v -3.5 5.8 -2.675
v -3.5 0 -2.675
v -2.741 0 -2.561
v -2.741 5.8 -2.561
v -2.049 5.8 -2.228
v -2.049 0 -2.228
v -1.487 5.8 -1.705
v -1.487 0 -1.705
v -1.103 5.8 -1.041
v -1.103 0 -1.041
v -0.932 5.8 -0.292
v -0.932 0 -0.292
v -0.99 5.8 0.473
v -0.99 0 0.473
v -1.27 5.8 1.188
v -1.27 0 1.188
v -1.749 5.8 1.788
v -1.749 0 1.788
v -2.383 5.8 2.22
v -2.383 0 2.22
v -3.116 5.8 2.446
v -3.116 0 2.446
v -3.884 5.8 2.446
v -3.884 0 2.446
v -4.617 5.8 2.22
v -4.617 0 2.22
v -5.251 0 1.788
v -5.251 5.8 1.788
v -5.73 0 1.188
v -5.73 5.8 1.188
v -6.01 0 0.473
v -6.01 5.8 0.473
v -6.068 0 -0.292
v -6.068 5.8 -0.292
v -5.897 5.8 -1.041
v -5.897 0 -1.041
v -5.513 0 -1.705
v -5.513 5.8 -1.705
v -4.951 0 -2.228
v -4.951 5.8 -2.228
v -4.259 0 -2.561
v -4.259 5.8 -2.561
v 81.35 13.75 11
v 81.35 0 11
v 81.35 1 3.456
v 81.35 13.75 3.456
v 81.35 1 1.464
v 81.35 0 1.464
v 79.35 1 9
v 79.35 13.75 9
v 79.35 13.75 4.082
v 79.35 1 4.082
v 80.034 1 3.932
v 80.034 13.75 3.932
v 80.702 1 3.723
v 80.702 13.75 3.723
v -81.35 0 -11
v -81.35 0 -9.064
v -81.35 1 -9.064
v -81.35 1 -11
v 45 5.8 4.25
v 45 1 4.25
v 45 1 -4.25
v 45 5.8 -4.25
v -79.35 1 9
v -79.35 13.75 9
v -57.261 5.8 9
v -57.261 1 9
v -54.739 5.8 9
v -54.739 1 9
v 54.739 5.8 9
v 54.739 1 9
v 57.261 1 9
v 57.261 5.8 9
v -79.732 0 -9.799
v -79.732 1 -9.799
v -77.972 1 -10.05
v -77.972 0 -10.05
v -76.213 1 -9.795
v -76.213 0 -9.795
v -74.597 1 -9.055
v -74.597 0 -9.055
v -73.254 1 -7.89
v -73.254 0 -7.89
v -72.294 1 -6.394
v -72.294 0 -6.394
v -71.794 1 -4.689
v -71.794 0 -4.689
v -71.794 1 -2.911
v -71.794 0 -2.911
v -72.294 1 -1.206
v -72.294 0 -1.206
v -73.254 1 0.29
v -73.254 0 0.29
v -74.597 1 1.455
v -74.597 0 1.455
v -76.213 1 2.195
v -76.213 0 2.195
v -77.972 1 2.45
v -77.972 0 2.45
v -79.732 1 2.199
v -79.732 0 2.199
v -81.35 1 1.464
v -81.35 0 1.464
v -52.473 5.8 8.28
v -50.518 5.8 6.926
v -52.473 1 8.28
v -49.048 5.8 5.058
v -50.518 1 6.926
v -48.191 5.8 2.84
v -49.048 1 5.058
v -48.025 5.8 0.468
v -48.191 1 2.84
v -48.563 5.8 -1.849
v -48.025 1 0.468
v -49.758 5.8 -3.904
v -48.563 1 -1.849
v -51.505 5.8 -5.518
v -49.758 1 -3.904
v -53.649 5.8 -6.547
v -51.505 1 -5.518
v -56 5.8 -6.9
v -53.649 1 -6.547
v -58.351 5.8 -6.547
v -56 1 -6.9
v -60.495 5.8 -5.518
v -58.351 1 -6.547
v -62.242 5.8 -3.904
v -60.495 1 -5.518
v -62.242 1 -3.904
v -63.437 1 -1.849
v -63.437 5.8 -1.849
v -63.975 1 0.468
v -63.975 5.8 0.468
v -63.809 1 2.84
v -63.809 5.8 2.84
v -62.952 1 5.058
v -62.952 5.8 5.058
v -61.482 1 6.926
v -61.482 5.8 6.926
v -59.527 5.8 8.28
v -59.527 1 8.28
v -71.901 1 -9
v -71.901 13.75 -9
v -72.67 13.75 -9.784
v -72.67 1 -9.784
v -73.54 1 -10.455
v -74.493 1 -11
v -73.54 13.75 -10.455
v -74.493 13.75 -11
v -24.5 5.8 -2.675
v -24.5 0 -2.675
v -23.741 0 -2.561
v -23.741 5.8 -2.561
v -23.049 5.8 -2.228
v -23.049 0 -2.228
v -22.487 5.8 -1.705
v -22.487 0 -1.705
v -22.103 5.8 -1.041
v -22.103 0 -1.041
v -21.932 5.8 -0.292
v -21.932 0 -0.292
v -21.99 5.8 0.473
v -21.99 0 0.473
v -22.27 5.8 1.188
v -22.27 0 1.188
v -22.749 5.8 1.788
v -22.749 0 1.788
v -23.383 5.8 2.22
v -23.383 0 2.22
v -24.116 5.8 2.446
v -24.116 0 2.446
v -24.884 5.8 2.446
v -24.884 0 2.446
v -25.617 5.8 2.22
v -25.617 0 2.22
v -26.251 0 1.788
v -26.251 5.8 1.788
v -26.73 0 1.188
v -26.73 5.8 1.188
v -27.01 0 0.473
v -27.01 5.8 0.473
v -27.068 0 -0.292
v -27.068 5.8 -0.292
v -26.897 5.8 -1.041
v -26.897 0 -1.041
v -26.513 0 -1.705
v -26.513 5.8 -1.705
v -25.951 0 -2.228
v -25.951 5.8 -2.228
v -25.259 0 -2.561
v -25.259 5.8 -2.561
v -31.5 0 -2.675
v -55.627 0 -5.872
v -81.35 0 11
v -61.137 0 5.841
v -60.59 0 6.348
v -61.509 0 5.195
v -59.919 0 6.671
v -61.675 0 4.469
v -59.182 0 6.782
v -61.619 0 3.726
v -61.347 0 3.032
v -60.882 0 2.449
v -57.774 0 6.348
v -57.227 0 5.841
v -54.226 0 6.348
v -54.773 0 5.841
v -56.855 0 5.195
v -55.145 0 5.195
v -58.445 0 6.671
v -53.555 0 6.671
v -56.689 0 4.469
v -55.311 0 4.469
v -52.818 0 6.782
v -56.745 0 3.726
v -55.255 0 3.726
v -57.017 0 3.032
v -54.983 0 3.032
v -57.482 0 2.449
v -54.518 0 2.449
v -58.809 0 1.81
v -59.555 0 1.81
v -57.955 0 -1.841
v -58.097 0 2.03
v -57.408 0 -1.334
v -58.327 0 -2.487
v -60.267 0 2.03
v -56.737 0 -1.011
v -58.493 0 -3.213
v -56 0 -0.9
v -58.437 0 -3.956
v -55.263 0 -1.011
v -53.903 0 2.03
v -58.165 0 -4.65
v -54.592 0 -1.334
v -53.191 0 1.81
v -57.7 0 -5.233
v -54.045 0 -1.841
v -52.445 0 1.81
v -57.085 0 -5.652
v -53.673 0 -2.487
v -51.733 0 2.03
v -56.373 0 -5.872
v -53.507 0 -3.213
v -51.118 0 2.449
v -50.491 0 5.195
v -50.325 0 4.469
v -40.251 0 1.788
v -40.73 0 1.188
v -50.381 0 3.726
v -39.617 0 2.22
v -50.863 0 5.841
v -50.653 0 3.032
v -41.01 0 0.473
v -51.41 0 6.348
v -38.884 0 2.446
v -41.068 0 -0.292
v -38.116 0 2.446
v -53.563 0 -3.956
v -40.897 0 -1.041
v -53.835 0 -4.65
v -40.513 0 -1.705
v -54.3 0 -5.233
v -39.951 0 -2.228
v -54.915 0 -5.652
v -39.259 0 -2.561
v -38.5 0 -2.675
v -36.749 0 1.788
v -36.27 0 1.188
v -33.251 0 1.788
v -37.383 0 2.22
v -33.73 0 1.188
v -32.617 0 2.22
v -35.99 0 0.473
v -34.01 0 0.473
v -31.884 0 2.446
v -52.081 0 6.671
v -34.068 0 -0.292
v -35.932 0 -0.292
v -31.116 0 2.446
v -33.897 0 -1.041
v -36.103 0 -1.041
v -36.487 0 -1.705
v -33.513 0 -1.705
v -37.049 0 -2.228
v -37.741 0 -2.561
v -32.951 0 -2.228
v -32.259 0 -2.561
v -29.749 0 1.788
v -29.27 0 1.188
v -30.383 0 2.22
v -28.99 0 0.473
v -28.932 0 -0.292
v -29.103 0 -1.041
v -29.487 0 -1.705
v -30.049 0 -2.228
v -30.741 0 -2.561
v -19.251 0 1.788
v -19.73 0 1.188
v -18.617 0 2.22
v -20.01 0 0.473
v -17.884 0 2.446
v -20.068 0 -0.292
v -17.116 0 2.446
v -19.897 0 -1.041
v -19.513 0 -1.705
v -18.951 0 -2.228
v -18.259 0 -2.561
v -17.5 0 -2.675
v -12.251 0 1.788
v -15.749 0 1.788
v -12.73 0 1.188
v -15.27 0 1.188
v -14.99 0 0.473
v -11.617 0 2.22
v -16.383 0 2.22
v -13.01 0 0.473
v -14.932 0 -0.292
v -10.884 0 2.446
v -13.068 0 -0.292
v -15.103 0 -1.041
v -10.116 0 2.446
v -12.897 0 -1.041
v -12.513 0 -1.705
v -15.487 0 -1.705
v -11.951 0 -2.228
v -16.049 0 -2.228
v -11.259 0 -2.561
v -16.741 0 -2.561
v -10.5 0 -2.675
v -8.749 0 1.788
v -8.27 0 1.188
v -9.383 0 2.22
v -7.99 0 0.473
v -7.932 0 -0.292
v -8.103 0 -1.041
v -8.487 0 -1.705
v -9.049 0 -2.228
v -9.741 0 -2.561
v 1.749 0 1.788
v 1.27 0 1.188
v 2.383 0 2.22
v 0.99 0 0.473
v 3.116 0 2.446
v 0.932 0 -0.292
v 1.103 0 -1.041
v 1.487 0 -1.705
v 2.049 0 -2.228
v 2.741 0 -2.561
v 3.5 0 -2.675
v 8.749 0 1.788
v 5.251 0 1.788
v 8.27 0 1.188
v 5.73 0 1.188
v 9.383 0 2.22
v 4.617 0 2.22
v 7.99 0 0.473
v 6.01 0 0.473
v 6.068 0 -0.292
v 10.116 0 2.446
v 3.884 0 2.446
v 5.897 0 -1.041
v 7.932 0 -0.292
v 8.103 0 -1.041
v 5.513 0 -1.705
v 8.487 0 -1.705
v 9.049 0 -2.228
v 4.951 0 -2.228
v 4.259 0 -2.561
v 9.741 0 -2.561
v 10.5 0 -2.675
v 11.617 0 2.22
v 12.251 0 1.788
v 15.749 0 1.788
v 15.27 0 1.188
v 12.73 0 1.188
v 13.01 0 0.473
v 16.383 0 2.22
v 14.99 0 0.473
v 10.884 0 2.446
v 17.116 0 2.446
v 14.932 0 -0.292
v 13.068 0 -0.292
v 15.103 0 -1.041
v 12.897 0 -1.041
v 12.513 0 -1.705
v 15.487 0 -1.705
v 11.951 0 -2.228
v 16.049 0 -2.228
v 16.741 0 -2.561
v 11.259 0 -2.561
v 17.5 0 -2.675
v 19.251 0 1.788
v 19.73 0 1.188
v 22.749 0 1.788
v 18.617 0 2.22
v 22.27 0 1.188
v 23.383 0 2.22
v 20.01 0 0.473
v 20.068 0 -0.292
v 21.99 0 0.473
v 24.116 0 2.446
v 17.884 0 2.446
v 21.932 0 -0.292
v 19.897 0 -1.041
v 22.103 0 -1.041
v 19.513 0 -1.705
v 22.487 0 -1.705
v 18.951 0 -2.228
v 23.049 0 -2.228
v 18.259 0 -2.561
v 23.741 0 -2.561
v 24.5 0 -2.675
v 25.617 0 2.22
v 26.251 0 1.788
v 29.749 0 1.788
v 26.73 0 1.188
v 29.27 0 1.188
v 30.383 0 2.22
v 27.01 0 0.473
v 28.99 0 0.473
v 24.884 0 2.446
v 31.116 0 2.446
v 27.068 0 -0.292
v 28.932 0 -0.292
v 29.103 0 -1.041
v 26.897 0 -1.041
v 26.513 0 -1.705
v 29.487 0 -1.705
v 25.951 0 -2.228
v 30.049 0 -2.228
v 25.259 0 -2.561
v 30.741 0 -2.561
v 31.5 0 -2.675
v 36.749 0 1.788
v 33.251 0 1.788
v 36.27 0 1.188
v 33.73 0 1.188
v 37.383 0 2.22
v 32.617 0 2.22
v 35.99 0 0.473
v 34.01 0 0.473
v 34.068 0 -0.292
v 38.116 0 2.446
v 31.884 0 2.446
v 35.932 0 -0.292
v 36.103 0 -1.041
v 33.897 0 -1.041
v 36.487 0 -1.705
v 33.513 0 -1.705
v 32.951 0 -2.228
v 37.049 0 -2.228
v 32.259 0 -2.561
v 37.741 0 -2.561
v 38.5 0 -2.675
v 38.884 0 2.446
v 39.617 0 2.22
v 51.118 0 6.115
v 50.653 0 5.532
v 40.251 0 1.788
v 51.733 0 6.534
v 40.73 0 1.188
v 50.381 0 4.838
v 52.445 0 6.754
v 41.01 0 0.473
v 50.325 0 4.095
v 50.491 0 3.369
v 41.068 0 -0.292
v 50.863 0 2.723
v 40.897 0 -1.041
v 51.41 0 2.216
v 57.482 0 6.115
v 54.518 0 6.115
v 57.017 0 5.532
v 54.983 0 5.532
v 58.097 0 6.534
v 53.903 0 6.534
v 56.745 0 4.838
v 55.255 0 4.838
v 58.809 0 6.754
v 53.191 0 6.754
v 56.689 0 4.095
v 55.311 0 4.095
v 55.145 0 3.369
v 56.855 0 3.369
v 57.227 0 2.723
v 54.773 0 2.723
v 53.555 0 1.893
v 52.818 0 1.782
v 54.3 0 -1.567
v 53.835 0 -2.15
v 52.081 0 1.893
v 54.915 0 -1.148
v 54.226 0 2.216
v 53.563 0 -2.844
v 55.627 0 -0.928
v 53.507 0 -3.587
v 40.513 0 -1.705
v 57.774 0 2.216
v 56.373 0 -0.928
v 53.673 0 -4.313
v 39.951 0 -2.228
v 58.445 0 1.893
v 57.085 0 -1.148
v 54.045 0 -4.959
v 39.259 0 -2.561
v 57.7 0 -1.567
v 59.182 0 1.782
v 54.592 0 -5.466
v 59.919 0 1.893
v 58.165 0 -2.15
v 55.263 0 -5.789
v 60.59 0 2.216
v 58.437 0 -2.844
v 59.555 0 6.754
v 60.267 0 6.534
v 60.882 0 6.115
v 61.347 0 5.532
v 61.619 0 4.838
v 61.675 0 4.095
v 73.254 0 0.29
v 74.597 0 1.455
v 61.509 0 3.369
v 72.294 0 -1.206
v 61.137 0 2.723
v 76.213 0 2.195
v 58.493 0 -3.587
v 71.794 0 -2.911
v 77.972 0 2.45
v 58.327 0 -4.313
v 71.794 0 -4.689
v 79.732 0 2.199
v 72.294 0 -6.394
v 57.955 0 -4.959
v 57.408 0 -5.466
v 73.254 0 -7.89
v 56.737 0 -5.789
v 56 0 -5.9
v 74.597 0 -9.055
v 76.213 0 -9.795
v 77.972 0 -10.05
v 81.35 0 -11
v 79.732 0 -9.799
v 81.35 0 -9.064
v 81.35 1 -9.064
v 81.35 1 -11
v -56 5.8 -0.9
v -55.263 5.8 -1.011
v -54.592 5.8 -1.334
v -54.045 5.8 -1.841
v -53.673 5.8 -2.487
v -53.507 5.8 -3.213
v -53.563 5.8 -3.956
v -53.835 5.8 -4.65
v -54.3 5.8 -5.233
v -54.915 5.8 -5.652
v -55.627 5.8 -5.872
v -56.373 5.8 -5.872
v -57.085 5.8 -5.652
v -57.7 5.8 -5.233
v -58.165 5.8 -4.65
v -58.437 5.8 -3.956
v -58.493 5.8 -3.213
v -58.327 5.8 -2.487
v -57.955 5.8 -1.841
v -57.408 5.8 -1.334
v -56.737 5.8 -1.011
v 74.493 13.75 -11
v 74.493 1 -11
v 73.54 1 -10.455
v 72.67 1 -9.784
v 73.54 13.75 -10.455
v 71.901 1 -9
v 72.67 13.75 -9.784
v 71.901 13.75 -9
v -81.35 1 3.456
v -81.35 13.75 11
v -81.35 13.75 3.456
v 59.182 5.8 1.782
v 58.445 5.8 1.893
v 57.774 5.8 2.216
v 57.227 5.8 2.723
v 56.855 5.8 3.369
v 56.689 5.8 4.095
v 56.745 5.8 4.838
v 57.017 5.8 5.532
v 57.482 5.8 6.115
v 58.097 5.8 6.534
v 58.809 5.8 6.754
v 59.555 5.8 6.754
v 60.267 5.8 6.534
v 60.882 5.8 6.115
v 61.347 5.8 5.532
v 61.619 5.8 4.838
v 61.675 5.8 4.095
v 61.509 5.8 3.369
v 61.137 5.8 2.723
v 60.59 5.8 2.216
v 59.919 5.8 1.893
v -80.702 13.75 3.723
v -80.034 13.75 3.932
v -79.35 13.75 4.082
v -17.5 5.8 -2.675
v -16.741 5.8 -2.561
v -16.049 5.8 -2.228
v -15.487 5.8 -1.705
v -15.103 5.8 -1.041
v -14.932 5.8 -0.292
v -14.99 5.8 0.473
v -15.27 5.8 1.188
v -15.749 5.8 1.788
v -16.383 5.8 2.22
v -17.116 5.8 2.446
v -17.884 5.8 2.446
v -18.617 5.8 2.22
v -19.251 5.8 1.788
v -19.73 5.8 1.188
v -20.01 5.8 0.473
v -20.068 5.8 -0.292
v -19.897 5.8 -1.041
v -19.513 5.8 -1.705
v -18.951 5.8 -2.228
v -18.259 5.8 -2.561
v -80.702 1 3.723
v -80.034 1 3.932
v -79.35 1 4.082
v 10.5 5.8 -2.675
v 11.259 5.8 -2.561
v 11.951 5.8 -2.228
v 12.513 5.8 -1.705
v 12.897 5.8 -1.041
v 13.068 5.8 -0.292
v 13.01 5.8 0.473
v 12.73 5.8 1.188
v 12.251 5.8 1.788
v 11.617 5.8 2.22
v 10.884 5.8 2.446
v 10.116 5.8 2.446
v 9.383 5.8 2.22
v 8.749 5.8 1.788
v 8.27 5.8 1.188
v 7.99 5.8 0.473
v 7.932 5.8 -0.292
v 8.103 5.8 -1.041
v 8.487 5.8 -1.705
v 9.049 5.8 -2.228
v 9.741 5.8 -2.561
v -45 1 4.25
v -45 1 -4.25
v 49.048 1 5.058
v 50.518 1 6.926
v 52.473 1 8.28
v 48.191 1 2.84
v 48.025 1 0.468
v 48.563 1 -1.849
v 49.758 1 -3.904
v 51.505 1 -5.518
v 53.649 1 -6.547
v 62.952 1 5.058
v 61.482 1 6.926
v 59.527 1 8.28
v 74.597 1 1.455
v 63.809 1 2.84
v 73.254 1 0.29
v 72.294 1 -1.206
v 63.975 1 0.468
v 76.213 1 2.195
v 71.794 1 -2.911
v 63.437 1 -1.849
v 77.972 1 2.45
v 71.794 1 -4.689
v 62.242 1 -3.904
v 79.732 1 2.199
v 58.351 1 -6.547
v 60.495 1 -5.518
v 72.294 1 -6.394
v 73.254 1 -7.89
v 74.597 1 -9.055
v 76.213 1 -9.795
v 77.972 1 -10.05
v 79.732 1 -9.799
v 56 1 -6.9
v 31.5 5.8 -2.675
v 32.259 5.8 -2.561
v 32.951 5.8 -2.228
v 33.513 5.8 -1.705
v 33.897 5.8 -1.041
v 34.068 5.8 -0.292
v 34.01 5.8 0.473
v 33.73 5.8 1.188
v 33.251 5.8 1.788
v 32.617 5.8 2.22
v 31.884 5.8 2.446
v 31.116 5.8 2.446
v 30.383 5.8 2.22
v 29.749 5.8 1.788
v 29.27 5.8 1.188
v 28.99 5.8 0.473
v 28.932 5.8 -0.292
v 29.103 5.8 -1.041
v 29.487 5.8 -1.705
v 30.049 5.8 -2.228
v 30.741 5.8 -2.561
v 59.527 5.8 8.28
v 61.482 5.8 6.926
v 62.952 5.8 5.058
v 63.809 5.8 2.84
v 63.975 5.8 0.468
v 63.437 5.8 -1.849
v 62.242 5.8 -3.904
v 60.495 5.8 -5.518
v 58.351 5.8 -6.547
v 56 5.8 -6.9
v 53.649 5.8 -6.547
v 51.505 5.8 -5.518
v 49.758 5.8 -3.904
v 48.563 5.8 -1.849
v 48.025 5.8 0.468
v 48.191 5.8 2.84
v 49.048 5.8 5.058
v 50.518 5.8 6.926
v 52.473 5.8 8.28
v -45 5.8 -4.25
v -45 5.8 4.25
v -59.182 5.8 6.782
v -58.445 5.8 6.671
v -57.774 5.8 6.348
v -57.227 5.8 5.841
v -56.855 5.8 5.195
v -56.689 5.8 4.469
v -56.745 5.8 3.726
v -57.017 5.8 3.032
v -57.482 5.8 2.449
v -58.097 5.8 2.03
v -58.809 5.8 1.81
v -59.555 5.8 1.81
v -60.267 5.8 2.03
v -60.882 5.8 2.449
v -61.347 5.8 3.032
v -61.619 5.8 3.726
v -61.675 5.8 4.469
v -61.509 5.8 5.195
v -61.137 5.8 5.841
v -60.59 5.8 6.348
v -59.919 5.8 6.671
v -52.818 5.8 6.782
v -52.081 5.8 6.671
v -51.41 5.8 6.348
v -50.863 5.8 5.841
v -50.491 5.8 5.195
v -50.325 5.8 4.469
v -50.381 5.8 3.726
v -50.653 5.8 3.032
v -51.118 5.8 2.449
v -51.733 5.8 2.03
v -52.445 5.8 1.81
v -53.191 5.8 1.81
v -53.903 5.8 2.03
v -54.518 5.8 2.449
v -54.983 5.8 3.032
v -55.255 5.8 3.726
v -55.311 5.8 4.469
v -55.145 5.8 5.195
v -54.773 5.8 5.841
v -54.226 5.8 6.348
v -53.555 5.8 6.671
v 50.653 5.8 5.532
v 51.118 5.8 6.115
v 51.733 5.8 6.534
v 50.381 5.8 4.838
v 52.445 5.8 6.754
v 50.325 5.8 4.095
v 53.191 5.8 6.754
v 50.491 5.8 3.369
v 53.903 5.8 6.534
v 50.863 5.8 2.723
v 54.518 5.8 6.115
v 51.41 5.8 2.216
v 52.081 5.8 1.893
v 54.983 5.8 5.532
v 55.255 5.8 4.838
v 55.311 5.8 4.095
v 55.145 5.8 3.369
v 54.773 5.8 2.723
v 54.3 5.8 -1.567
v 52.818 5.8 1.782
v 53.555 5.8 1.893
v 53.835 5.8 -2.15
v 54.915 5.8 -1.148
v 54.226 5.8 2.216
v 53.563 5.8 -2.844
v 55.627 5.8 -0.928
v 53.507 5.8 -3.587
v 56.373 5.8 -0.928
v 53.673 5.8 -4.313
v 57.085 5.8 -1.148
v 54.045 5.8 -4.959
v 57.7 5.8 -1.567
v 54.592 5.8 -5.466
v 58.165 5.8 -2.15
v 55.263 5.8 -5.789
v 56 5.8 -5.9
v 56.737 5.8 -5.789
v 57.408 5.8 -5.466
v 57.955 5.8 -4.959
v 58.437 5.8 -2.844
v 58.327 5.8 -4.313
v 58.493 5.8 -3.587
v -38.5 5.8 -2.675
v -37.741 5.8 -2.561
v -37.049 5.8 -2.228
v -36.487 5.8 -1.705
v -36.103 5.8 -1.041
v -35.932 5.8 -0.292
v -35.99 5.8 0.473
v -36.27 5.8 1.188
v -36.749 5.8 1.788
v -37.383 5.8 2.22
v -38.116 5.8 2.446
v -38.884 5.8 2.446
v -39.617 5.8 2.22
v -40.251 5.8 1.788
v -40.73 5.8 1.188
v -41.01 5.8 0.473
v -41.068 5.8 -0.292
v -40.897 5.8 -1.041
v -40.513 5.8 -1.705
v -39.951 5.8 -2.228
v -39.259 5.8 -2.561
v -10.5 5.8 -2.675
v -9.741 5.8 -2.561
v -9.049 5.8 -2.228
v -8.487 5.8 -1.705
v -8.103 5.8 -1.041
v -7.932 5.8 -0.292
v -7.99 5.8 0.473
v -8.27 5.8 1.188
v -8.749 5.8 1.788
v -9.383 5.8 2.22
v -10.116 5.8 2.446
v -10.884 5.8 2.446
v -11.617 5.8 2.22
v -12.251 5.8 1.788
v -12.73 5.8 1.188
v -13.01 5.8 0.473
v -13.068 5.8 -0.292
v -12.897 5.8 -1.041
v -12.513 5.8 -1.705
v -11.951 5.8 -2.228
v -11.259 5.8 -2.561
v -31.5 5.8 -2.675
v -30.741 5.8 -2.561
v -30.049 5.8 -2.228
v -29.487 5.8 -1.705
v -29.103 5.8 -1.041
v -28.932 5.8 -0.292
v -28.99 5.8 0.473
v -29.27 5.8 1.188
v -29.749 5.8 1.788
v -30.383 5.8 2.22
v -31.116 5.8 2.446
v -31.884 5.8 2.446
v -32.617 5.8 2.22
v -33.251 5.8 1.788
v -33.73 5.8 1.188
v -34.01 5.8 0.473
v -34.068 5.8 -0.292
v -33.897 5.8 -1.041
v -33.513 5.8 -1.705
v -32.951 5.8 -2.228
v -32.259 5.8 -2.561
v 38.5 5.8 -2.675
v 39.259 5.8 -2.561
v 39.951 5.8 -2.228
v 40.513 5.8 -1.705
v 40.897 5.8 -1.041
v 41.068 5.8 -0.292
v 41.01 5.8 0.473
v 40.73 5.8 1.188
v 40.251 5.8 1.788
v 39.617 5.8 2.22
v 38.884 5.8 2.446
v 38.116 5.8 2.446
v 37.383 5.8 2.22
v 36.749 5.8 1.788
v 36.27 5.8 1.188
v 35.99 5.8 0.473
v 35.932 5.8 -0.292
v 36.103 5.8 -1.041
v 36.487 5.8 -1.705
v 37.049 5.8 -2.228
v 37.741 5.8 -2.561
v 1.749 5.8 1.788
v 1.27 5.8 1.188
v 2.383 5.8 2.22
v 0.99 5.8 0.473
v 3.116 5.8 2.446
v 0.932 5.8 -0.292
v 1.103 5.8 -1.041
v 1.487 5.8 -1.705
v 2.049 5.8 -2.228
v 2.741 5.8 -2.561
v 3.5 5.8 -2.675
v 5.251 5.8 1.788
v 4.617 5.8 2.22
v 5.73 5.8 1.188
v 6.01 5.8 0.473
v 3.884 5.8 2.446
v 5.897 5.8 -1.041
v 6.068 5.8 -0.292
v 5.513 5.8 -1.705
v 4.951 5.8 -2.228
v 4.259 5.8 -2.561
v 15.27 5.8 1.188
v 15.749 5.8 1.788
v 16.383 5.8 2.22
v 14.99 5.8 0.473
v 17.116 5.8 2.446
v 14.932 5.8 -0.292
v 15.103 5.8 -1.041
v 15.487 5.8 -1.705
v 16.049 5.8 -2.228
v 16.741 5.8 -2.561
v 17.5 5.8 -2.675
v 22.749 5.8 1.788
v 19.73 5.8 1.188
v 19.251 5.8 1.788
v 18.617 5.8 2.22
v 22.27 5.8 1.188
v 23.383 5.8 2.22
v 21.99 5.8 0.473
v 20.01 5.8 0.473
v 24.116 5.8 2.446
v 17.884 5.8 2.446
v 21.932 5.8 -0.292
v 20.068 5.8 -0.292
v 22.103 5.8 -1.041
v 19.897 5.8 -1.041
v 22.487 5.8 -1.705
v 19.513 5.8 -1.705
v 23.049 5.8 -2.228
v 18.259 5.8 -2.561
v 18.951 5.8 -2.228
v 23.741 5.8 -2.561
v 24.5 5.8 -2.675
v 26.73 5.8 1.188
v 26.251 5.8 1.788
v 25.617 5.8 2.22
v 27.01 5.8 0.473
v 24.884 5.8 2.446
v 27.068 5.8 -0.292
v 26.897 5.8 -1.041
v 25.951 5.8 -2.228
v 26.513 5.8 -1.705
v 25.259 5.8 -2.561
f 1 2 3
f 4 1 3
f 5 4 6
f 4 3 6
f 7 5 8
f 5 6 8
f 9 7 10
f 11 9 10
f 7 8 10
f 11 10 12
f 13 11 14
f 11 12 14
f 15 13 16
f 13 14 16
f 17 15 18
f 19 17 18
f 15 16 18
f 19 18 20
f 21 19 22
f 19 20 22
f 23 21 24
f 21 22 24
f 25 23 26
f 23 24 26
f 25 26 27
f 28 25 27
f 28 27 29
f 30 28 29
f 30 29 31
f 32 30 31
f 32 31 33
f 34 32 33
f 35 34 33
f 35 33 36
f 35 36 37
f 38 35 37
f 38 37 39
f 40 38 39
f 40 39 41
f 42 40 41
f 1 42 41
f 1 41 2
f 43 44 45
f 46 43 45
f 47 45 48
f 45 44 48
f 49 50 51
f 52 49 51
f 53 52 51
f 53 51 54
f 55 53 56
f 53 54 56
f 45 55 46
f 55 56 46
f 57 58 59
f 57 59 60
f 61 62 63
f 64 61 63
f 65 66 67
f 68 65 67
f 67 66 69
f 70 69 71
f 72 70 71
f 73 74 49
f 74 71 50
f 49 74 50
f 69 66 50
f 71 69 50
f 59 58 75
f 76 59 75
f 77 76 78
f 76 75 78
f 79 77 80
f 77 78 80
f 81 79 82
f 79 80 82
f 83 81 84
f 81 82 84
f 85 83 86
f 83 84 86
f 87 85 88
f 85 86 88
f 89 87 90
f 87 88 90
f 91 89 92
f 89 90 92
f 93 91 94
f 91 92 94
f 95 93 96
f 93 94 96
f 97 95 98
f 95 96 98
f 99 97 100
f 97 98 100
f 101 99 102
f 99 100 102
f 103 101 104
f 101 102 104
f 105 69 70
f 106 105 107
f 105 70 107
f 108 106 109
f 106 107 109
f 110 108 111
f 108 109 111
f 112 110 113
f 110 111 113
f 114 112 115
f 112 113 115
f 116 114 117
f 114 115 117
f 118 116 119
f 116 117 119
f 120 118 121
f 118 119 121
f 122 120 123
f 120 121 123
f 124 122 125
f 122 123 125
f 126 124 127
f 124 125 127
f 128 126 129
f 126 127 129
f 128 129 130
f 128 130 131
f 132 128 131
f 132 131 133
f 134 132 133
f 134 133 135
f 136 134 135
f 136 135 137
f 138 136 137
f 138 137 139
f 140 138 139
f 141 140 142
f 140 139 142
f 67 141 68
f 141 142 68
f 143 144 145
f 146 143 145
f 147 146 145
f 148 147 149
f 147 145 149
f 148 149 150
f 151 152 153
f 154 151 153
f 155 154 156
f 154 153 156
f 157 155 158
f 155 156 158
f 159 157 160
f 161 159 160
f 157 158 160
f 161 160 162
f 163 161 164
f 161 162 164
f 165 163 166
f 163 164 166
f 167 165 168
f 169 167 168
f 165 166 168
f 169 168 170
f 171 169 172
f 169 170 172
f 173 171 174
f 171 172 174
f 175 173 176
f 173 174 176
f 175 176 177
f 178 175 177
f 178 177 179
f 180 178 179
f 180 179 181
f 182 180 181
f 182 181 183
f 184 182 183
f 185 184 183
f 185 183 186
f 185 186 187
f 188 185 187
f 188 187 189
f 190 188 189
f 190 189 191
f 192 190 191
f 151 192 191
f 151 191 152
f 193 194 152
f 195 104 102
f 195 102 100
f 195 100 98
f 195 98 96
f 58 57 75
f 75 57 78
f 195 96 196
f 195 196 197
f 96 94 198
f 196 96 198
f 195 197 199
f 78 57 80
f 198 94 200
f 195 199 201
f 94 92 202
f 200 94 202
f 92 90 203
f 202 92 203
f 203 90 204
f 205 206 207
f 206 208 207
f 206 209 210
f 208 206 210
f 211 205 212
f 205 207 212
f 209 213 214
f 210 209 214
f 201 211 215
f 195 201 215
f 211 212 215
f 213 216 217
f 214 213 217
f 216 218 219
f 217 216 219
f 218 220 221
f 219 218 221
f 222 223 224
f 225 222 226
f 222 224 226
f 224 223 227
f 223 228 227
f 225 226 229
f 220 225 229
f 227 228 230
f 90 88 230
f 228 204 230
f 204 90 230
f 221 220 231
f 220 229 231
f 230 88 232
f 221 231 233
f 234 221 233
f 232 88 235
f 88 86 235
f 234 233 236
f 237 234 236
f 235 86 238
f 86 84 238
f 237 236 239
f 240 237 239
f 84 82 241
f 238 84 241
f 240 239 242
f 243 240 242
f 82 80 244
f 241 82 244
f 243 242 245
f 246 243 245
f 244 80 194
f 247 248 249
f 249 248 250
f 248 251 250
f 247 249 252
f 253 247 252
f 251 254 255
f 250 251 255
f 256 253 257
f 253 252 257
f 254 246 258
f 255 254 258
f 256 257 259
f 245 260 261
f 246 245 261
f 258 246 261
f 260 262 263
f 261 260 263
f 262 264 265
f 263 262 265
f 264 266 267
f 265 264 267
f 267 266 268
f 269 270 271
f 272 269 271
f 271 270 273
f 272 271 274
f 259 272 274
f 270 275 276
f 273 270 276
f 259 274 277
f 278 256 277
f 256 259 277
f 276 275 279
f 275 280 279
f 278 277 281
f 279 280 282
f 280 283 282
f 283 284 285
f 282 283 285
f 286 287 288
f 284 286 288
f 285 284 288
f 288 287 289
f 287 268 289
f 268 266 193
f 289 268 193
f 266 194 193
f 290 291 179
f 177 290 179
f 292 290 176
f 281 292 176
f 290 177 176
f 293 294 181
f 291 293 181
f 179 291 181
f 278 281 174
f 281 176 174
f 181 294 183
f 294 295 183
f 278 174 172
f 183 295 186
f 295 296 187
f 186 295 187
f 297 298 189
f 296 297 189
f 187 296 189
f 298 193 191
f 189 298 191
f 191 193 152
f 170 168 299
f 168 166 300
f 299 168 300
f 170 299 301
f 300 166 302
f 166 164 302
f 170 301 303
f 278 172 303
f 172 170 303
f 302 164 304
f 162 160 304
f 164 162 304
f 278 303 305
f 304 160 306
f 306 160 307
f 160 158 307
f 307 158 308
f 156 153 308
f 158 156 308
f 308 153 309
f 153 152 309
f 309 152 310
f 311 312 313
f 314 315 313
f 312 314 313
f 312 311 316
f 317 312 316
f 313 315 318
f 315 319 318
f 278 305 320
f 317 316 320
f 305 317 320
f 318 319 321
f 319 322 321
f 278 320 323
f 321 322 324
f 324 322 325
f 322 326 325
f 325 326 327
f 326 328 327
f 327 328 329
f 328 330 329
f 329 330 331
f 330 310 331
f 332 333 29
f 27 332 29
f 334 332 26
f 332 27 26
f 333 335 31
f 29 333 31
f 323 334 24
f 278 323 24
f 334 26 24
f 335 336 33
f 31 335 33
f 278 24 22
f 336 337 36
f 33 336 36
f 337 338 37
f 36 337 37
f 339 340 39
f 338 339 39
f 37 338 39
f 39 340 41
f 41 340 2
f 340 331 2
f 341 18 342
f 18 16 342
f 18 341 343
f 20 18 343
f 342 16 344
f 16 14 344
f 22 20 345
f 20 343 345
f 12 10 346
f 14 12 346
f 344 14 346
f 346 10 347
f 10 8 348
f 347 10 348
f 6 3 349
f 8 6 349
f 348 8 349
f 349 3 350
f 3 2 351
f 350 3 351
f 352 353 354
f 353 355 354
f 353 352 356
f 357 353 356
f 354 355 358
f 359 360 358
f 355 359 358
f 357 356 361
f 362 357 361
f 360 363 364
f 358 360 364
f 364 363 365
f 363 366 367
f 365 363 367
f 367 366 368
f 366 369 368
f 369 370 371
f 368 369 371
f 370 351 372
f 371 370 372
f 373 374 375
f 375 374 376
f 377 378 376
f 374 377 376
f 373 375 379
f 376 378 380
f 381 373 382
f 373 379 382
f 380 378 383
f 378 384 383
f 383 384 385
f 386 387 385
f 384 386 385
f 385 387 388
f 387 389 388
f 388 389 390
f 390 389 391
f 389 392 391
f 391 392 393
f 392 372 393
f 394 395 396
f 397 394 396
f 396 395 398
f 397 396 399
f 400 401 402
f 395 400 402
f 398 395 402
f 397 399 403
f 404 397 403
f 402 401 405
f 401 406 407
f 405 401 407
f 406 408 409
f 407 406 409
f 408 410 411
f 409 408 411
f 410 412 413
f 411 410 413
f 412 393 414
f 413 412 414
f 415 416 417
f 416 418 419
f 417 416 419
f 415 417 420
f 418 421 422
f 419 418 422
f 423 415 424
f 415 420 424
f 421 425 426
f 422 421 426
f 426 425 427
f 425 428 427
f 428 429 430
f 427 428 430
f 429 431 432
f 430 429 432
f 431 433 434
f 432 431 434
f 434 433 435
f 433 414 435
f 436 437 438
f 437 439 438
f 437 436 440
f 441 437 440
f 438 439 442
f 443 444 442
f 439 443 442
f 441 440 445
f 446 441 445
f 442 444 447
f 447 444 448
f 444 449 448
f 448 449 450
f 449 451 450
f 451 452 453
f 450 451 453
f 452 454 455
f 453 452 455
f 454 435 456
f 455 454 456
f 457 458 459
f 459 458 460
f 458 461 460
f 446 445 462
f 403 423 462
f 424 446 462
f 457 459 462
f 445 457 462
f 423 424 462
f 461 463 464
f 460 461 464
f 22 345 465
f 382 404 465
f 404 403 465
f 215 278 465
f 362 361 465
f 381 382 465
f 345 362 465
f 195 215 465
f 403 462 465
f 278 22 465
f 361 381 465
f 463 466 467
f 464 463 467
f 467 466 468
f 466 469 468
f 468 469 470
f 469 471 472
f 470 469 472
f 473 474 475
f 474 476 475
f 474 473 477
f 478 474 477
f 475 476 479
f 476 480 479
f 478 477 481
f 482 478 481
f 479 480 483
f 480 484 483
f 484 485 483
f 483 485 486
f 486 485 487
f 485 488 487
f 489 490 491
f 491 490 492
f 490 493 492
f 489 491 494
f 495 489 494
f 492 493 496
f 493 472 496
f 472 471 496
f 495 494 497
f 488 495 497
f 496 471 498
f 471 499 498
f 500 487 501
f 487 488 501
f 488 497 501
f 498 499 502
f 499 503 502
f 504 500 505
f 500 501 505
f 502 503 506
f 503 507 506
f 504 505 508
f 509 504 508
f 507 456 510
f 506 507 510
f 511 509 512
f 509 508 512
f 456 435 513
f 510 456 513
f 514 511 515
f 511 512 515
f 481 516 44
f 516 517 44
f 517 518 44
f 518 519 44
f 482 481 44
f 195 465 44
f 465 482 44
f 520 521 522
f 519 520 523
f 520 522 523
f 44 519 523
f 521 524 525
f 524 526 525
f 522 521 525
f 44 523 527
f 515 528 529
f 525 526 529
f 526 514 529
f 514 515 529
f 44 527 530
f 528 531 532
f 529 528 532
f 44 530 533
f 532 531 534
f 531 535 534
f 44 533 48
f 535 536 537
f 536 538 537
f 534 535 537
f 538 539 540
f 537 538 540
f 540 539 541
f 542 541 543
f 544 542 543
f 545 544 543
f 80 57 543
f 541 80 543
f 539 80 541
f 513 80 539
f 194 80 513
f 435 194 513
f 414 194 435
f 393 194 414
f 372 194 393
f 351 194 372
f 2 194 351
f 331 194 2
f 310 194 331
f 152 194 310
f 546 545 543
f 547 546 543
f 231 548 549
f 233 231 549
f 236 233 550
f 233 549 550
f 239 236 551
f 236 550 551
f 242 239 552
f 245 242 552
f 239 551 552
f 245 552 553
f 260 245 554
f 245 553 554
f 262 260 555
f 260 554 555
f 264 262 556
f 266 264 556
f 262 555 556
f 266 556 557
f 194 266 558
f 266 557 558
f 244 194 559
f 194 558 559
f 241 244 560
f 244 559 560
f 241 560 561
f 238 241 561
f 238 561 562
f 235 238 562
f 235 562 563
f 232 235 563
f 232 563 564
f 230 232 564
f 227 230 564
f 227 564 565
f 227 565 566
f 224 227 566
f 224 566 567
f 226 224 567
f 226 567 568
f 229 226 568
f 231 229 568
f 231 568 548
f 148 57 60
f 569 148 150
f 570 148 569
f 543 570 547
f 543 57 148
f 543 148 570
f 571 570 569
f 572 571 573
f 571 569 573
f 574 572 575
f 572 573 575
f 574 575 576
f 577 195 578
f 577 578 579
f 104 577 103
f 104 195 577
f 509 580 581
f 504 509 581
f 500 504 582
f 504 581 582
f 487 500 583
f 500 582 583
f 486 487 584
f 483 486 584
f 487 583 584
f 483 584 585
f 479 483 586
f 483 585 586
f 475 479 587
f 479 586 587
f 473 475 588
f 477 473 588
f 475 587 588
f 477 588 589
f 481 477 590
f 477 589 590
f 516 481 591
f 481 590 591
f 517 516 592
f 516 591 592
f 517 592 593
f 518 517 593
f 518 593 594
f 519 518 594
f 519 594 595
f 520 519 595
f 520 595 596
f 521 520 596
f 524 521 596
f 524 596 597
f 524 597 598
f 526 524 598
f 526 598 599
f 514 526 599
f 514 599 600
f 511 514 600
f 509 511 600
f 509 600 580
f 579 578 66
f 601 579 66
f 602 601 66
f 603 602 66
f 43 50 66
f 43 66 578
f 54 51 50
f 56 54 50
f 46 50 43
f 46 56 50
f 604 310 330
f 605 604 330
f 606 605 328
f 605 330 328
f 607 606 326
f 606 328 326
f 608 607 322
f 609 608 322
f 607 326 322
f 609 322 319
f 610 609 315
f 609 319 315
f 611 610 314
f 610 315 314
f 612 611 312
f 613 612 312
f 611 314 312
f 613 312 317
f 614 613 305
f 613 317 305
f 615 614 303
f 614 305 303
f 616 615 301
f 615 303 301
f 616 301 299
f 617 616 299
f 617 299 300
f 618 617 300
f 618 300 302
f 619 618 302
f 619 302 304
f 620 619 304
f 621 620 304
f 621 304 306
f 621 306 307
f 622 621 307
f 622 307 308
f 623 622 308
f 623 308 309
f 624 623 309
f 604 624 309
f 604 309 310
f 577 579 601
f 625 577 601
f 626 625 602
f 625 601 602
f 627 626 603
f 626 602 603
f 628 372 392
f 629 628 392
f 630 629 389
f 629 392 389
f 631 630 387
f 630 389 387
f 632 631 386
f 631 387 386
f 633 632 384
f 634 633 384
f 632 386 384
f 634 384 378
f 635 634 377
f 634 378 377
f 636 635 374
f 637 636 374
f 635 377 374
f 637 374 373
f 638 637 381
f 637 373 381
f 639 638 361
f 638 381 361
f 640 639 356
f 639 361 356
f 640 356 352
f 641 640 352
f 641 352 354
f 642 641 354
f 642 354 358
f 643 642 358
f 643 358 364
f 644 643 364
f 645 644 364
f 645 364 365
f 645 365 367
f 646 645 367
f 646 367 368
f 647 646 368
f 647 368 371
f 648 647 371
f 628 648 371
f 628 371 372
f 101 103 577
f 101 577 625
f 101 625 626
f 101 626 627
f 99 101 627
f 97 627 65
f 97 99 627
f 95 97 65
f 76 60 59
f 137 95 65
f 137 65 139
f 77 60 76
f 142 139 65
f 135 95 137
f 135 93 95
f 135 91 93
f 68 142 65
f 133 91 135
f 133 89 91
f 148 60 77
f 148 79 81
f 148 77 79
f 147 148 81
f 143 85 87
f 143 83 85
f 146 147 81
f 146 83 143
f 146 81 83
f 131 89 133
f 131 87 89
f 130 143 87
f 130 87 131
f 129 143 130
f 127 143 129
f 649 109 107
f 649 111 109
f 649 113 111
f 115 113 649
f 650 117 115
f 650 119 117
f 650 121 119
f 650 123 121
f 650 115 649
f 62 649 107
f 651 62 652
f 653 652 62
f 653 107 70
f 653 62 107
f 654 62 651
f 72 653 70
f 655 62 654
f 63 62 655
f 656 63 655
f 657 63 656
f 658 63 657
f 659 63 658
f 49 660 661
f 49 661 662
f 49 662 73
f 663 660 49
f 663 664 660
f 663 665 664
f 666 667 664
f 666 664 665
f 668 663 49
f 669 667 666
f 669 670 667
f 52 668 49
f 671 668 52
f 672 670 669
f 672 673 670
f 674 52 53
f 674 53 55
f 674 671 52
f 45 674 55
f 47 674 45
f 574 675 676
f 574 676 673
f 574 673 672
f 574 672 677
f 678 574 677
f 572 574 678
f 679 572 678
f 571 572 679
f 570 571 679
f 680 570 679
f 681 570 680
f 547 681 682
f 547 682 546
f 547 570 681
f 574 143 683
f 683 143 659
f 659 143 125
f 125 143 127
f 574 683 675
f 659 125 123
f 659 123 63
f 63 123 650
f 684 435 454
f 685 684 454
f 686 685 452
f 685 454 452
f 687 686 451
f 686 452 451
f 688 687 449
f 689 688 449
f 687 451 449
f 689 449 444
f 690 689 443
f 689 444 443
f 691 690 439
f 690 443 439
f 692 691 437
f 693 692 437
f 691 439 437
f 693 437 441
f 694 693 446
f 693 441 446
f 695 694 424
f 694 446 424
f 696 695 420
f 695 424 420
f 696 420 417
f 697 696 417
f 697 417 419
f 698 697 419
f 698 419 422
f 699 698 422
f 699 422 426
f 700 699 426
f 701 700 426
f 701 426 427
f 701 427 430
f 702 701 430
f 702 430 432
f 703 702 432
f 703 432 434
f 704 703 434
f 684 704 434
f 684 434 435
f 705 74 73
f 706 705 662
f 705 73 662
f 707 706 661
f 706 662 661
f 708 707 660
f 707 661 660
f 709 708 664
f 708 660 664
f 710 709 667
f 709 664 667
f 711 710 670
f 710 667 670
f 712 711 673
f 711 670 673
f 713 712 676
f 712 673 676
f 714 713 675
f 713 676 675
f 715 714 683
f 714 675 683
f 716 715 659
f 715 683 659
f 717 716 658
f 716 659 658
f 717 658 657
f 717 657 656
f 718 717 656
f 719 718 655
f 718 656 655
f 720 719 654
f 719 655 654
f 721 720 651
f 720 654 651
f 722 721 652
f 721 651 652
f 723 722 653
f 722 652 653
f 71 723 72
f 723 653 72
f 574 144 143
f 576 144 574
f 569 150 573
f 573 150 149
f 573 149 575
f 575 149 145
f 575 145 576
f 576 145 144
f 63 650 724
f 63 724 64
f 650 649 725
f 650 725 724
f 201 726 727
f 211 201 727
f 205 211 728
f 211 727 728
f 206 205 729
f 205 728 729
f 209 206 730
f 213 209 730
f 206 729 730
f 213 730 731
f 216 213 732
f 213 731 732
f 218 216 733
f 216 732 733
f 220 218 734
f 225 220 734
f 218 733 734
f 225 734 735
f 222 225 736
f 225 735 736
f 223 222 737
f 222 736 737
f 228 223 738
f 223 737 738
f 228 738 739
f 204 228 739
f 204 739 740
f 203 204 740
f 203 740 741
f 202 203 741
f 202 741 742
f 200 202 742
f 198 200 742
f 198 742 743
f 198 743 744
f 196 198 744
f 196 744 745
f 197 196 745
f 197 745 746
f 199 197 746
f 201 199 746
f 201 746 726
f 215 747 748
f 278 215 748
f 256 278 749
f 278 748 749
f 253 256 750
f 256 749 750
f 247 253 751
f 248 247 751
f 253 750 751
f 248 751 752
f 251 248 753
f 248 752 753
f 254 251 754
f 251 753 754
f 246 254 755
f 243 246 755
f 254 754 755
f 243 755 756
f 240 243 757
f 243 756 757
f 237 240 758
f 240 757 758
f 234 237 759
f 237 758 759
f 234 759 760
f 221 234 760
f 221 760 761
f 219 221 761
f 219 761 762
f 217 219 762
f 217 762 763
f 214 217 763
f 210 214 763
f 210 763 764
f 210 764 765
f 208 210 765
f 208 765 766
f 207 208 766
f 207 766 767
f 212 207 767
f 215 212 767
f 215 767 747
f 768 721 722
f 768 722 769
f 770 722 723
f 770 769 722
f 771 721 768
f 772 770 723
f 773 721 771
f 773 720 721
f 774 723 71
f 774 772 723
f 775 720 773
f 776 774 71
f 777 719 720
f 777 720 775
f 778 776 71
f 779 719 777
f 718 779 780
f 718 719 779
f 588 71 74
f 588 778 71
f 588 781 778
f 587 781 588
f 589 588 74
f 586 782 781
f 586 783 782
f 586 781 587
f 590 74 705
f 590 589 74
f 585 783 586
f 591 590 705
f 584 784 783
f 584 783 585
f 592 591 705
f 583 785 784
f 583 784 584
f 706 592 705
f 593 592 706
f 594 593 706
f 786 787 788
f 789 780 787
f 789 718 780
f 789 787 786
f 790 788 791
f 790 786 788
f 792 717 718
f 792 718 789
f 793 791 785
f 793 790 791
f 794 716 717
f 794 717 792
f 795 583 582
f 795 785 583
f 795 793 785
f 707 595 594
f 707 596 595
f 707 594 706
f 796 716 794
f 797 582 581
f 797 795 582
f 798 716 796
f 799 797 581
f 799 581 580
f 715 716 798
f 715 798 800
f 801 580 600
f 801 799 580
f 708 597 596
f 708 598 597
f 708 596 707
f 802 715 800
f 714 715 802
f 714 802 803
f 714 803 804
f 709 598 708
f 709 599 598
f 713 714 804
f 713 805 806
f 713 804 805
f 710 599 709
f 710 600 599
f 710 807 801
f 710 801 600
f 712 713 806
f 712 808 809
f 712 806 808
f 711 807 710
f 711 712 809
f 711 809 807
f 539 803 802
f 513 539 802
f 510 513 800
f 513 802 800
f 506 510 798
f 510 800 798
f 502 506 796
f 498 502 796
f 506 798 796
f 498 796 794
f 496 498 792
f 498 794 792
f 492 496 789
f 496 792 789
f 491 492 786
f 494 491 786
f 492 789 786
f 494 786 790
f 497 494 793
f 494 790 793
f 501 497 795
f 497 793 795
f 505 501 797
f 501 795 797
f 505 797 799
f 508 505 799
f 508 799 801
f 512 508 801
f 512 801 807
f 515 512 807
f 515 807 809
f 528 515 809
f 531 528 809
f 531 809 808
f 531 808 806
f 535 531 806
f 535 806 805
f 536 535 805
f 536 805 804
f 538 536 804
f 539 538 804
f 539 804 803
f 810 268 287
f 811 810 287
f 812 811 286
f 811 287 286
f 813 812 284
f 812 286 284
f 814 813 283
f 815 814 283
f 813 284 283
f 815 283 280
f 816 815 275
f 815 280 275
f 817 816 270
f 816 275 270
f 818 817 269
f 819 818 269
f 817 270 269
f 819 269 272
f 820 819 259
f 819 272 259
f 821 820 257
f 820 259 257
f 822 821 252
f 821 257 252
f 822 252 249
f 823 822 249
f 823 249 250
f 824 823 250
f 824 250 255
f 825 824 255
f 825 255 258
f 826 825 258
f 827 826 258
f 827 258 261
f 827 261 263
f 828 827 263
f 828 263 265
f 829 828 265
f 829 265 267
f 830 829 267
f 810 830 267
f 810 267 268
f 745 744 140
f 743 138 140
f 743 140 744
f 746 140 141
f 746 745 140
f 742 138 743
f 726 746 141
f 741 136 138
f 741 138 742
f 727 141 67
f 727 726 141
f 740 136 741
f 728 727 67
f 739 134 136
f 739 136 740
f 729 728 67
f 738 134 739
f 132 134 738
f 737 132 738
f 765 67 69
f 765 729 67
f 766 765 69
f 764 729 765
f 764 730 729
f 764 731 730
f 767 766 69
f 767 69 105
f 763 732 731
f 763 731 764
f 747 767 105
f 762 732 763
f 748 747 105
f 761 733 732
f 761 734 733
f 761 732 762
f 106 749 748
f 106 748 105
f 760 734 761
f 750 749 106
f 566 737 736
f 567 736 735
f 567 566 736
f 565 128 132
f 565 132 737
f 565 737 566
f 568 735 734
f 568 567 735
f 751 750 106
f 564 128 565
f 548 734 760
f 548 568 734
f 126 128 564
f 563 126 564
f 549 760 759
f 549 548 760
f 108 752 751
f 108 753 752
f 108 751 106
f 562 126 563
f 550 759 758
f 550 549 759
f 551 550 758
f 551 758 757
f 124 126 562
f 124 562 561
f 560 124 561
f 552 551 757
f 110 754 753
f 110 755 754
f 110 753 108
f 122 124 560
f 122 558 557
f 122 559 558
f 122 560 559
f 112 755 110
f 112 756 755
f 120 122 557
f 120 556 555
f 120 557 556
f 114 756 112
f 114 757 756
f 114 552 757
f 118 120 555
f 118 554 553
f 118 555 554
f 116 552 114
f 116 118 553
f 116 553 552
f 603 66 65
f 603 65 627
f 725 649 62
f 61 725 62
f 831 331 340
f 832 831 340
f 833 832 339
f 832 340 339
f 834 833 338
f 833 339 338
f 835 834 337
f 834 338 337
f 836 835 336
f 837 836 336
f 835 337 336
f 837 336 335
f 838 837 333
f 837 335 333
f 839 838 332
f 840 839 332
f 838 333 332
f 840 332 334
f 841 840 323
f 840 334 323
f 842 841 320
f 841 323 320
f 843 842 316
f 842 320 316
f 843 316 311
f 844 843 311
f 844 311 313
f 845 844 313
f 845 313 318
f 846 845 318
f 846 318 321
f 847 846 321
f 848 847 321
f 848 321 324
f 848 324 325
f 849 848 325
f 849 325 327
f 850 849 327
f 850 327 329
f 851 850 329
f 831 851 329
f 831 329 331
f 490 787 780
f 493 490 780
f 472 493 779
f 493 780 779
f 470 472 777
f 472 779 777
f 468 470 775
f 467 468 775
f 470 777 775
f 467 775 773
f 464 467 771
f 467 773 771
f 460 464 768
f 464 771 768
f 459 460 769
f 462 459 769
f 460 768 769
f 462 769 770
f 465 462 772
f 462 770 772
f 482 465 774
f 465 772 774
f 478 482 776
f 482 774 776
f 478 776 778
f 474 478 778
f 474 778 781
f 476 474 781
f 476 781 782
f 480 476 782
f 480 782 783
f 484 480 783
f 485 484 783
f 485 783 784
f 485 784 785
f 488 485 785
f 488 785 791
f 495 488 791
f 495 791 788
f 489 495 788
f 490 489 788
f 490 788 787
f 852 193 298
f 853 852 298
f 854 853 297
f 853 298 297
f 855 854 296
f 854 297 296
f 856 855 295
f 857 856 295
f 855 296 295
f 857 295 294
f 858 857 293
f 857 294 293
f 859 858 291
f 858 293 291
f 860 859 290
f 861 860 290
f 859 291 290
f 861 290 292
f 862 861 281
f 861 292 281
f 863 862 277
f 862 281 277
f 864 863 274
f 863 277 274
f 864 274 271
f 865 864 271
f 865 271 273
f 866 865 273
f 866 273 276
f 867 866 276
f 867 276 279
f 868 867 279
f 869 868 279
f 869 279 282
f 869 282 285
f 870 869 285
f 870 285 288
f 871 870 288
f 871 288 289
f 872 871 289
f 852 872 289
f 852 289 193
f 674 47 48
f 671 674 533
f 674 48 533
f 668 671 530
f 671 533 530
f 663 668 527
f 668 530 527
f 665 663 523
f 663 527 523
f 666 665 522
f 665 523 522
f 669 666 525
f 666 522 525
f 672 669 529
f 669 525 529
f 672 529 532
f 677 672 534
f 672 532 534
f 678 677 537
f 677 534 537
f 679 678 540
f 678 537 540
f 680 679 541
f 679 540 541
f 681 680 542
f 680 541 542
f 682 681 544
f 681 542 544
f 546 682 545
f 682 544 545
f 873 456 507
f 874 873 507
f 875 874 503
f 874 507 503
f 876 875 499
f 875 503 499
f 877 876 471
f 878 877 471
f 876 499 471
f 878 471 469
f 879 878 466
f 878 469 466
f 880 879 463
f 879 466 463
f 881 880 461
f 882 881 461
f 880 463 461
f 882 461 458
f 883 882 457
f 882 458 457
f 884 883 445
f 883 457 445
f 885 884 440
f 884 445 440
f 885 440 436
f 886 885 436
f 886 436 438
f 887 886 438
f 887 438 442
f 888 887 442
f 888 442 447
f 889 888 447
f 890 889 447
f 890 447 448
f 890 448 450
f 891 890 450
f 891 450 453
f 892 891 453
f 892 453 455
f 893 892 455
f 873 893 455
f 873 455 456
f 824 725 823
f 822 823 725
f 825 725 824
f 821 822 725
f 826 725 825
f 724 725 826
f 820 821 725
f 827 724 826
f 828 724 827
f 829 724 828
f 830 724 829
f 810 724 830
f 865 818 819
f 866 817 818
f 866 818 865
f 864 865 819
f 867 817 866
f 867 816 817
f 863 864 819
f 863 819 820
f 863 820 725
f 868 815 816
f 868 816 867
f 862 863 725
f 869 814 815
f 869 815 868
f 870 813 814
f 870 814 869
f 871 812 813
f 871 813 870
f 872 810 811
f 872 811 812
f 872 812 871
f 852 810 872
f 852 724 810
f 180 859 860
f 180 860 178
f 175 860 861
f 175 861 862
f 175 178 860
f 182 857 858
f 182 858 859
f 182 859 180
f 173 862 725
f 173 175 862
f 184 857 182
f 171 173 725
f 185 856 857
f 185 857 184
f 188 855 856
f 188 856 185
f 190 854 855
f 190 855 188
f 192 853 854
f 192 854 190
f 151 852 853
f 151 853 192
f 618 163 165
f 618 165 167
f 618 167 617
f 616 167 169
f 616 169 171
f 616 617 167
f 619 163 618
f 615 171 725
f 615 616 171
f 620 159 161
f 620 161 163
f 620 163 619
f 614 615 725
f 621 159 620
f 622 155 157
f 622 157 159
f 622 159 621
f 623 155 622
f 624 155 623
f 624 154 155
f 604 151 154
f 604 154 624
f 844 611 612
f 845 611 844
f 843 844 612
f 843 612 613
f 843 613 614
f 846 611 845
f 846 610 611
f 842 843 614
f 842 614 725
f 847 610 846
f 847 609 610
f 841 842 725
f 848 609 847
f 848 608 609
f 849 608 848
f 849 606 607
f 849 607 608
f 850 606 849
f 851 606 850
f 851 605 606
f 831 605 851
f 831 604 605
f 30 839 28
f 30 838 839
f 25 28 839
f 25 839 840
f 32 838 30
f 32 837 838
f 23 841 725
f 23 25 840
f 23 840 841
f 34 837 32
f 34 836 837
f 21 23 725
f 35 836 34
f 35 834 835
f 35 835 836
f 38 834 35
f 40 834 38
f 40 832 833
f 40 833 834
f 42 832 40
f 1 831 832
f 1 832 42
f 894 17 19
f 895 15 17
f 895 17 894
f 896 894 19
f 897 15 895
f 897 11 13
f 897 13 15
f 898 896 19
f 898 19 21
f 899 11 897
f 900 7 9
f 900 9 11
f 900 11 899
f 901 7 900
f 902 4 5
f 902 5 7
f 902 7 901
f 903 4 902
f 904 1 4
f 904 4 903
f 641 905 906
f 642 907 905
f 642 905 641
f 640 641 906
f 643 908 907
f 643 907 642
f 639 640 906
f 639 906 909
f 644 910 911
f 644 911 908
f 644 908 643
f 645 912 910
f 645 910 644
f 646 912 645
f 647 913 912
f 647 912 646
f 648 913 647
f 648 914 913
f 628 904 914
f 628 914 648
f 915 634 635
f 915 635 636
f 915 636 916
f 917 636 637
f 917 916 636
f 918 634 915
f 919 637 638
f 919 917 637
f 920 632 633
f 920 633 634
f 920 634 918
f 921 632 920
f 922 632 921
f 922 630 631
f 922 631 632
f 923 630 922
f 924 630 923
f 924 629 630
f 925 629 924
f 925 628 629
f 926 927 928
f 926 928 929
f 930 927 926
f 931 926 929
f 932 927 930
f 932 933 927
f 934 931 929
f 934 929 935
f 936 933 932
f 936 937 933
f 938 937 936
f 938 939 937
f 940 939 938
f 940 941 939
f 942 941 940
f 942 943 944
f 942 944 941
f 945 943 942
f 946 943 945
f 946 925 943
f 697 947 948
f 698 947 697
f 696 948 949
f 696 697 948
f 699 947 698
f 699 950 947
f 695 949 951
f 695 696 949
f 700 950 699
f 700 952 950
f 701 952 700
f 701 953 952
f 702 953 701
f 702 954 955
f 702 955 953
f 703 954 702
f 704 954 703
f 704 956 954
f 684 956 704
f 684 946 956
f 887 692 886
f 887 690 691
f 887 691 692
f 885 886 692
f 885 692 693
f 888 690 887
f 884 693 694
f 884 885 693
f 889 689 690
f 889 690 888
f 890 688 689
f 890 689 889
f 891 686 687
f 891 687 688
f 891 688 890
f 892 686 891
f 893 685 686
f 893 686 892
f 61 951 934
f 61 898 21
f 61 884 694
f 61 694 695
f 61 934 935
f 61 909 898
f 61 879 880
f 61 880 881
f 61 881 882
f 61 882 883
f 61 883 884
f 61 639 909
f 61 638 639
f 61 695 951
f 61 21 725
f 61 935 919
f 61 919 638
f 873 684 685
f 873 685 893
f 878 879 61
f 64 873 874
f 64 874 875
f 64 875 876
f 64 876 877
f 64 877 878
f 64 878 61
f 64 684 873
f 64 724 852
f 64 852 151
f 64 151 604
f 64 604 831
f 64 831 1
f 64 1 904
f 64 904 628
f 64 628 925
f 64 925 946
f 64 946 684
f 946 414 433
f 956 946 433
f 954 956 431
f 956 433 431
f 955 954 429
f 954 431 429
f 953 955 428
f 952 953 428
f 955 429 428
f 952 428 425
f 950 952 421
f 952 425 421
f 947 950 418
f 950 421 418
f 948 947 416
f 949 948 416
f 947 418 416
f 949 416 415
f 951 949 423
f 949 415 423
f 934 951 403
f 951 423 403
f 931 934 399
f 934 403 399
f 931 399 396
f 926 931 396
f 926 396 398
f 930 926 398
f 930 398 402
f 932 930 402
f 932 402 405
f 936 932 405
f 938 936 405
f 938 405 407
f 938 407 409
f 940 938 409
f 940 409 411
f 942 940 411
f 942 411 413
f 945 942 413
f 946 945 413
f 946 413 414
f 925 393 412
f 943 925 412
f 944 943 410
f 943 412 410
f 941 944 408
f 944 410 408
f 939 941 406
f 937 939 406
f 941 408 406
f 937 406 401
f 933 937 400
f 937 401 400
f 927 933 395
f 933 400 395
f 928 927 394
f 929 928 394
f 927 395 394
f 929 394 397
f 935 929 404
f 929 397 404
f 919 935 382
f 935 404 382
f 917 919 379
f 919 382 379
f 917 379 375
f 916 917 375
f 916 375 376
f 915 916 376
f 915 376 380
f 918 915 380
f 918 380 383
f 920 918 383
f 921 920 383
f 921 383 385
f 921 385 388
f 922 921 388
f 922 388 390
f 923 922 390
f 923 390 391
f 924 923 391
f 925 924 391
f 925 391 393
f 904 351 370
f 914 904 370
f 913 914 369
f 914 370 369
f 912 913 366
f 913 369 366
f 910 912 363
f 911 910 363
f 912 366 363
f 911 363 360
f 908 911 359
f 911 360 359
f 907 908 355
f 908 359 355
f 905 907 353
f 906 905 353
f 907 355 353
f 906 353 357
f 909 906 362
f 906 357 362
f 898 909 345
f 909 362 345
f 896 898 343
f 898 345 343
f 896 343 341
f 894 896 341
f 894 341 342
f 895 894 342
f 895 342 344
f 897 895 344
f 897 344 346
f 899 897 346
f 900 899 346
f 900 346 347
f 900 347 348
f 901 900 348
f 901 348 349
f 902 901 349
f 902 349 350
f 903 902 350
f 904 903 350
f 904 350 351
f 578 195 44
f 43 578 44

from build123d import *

# Parameters (mm, degrees)
SKETCH1_W           = 162.7
SKETCH1_H           = 22
BOSS_EXTRUDE1_DEPTH = 13.75
SKETCH2_W           = 158.7
SKETCH2_H           = 18
CUT_EXTRUDE1_DEPTH  = 12.75
SKETCH4_W           = 90
SKETCH4_H           = 8.5
BOSS_EXTRUDE2_DEPTH = 5.8
SKETCH3_R           = 2.575
CUT_EXTRUDE2_DEPTH  = 84.233917365
SKETCH7_R           = 8
CUT_EXTRUDE4_DEPTH  = 12.75
SKETCH5_R           = 6.25
CUT_EXTRUDE5_DEPTH  = 84.233917365
SKETCH8_R           = 8
BOSS_EXTRUDE4_DEPTH = 4.8
SKETCH10_W          = 90
SKETCH10_H          = 8.5
CUT_EXTRUDE6_DEPTH  = 1
SKETCH11_R          = 2.5
CUT_EXTRUDE7_DEPTH  = 83.474389964


with BuildPart() as part:
    # Sketch1 → Boss-Extrude1 (new body)
    with BuildSketch(Plane(origin=(0, 0, 0), x_dir=(1, 0, 0), z_dir=(0, 1, 0))):
        Rectangle(SKETCH1_W, SKETCH1_H)
    extrude(amount=BOSS_EXTRUDE1_DEPTH)

    # Sketch2 → Cut-Extrude1 (cut)
    with BuildSketch(Plane(origin=(0, 13.75, 0), x_dir=(1, 0, 0), z_dir=(0, 1, 0))):
        Rectangle(SKETCH2_W, SKETCH2_H)
    extrude(amount=-CUT_EXTRUDE1_DEPTH, mode=Mode.SUBTRACT)

    # Sketch4 → Boss-Extrude2 (add)
    with BuildSketch(Plane(origin=(0, 1, 0), x_dir=(1, 0, 0), z_dir=(0, 1, 0))):
        Rectangle(SKETCH4_W, SKETCH4_H)
    extrude(amount=BOSS_EXTRUDE2_DEPTH)

    # Sketch3 → Cut-Extrude2 (cut, through all)
    with BuildSketch(Plane.XZ):
        with Locations(Location((-3.5, -0.1, 0), (0, 0, 270))):
            Circle(SKETCH3_R)
        with Locations(Location((-10.5, -0.1, 0), (0, 0, 270))):
            Circle(SKETCH3_R)
        with Locations(Location((-17.5, -0.1, 0), (0, 0, 270))):
            Circle(SKETCH3_R)
        with Locations(Location((-24.5, -0.1, 0), (0, 0, 270))):
            Circle(SKETCH3_R)
        with Locations(Location((-31.5, -0.1, 0), (0, 0, 270))):
            Circle(SKETCH3_R)
        with Locations(Location((-38.5, -0.1, 0), (0, 0, 270))):
            Circle(SKETCH3_R)
        with Locations(Location((38.5, -0.1, 0), (0, 0, 270))):
            Circle(SKETCH3_R)
        with Locations(Location((31.5, -0.1, 0), (0, 0, 270))):
            Circle(SKETCH3_R)
        with Locations(Location((24.5, -0.1, 0), (0, 0, 270))):
            Circle(SKETCH3_R)
        with Locations(Location((17.5, -0.1, 0), (0, 0, 270))):
            Circle(SKETCH3_R)
        with Locations(Location((10.5, -0.1, 0), (0, 0, 270))):
            Circle(SKETCH3_R)
        with Locations(Location((3.5, -0.1, 0), (0, 0, 270))):
            Circle(SKETCH3_R)
    extrude(amount=-CUT_EXTRUDE2_DEPTH, mode=Mode.SUBTRACT)

    # Sketch7 → Cut-Extrude4 (cut)
    with BuildSketch(Plane(origin=(0, 13.75, 0), x_dir=(1, 0, 0), z_dir=(0, 1, 0))):
        with Locations((-77.98, 3.8)):
            Circle(SKETCH7_R)
        with Locations((77.98, 3.8)):
            Circle(SKETCH7_R)
    extrude(amount=-CUT_EXTRUDE4_DEPTH, mode=Mode.SUBTRACT)

    # Sketch5 → Cut-Extrude5 (cut, through all)
    with BuildSketch(Plane.XZ):
        with Locations((-77.98, -3.8)):
            Circle(SKETCH5_R)
        with Locations((77.98, -3.8)):
            Circle(SKETCH5_R)
    extrude(amount=-CUT_EXTRUDE5_DEPTH, mode=Mode.SUBTRACT)

    # Sketch8 → Boss-Extrude4 (add)
    with BuildSketch(Plane(origin=(0, 1, 0), x_dir=(1, 0, 0), z_dir=(0, 1, 0))):
        with Locations((-56, -1.1)):
            Circle(SKETCH8_R)
        with Locations((56, -1.1)):
            Circle(SKETCH8_R)
    extrude(amount=BOSS_EXTRUDE4_DEPTH)

    # Sketch10 → Cut-Extrude6 (cut)
    with BuildSketch(Plane(origin=(0, 6.8, 0), x_dir=(1, 0, 0), z_dir=(0, 1, 0))):
        Rectangle(SKETCH10_W, SKETCH10_H)
    extrude(amount=-CUT_EXTRUDE6_DEPTH, mode=Mode.SUBTRACT)

    # Sketch11 → Cut-Extrude7 (cut, through all)
    with BuildSketch(Plane(origin=(0, 5.8, 0), x_dir=(1, 0, 0), z_dir=(0, 1, 0))):
        with Locations(Location((-56, 3.4, 0), (0, 0, 270))):
            Circle(SKETCH11_R)
        with Locations(Location((-59.181980515, -4.281980515, 0), (0, 0, 270))):
            Circle(SKETCH11_R)
        with Locations(Location((-52.818019485, -4.281980515, 0), (0, 0, 270))):
            Circle(SKETCH11_R)
        with Locations(Location((52.818019485, -4.281980515, 0), (0, 0, 90))):
            Circle(SKETCH11_R)
        with Locations(Location((59.181980515, -4.281980515, 0), (0, 0, 90))):
            Circle(SKETCH11_R)
        with Locations(Location((56, 3.4, 0), (0, 0, 90))):
            Circle(SKETCH11_R)
    extrude(amount=-CUT_EXTRUDE7_DEPTH, mode=Mode.SUBTRACT)


solid = part.part
